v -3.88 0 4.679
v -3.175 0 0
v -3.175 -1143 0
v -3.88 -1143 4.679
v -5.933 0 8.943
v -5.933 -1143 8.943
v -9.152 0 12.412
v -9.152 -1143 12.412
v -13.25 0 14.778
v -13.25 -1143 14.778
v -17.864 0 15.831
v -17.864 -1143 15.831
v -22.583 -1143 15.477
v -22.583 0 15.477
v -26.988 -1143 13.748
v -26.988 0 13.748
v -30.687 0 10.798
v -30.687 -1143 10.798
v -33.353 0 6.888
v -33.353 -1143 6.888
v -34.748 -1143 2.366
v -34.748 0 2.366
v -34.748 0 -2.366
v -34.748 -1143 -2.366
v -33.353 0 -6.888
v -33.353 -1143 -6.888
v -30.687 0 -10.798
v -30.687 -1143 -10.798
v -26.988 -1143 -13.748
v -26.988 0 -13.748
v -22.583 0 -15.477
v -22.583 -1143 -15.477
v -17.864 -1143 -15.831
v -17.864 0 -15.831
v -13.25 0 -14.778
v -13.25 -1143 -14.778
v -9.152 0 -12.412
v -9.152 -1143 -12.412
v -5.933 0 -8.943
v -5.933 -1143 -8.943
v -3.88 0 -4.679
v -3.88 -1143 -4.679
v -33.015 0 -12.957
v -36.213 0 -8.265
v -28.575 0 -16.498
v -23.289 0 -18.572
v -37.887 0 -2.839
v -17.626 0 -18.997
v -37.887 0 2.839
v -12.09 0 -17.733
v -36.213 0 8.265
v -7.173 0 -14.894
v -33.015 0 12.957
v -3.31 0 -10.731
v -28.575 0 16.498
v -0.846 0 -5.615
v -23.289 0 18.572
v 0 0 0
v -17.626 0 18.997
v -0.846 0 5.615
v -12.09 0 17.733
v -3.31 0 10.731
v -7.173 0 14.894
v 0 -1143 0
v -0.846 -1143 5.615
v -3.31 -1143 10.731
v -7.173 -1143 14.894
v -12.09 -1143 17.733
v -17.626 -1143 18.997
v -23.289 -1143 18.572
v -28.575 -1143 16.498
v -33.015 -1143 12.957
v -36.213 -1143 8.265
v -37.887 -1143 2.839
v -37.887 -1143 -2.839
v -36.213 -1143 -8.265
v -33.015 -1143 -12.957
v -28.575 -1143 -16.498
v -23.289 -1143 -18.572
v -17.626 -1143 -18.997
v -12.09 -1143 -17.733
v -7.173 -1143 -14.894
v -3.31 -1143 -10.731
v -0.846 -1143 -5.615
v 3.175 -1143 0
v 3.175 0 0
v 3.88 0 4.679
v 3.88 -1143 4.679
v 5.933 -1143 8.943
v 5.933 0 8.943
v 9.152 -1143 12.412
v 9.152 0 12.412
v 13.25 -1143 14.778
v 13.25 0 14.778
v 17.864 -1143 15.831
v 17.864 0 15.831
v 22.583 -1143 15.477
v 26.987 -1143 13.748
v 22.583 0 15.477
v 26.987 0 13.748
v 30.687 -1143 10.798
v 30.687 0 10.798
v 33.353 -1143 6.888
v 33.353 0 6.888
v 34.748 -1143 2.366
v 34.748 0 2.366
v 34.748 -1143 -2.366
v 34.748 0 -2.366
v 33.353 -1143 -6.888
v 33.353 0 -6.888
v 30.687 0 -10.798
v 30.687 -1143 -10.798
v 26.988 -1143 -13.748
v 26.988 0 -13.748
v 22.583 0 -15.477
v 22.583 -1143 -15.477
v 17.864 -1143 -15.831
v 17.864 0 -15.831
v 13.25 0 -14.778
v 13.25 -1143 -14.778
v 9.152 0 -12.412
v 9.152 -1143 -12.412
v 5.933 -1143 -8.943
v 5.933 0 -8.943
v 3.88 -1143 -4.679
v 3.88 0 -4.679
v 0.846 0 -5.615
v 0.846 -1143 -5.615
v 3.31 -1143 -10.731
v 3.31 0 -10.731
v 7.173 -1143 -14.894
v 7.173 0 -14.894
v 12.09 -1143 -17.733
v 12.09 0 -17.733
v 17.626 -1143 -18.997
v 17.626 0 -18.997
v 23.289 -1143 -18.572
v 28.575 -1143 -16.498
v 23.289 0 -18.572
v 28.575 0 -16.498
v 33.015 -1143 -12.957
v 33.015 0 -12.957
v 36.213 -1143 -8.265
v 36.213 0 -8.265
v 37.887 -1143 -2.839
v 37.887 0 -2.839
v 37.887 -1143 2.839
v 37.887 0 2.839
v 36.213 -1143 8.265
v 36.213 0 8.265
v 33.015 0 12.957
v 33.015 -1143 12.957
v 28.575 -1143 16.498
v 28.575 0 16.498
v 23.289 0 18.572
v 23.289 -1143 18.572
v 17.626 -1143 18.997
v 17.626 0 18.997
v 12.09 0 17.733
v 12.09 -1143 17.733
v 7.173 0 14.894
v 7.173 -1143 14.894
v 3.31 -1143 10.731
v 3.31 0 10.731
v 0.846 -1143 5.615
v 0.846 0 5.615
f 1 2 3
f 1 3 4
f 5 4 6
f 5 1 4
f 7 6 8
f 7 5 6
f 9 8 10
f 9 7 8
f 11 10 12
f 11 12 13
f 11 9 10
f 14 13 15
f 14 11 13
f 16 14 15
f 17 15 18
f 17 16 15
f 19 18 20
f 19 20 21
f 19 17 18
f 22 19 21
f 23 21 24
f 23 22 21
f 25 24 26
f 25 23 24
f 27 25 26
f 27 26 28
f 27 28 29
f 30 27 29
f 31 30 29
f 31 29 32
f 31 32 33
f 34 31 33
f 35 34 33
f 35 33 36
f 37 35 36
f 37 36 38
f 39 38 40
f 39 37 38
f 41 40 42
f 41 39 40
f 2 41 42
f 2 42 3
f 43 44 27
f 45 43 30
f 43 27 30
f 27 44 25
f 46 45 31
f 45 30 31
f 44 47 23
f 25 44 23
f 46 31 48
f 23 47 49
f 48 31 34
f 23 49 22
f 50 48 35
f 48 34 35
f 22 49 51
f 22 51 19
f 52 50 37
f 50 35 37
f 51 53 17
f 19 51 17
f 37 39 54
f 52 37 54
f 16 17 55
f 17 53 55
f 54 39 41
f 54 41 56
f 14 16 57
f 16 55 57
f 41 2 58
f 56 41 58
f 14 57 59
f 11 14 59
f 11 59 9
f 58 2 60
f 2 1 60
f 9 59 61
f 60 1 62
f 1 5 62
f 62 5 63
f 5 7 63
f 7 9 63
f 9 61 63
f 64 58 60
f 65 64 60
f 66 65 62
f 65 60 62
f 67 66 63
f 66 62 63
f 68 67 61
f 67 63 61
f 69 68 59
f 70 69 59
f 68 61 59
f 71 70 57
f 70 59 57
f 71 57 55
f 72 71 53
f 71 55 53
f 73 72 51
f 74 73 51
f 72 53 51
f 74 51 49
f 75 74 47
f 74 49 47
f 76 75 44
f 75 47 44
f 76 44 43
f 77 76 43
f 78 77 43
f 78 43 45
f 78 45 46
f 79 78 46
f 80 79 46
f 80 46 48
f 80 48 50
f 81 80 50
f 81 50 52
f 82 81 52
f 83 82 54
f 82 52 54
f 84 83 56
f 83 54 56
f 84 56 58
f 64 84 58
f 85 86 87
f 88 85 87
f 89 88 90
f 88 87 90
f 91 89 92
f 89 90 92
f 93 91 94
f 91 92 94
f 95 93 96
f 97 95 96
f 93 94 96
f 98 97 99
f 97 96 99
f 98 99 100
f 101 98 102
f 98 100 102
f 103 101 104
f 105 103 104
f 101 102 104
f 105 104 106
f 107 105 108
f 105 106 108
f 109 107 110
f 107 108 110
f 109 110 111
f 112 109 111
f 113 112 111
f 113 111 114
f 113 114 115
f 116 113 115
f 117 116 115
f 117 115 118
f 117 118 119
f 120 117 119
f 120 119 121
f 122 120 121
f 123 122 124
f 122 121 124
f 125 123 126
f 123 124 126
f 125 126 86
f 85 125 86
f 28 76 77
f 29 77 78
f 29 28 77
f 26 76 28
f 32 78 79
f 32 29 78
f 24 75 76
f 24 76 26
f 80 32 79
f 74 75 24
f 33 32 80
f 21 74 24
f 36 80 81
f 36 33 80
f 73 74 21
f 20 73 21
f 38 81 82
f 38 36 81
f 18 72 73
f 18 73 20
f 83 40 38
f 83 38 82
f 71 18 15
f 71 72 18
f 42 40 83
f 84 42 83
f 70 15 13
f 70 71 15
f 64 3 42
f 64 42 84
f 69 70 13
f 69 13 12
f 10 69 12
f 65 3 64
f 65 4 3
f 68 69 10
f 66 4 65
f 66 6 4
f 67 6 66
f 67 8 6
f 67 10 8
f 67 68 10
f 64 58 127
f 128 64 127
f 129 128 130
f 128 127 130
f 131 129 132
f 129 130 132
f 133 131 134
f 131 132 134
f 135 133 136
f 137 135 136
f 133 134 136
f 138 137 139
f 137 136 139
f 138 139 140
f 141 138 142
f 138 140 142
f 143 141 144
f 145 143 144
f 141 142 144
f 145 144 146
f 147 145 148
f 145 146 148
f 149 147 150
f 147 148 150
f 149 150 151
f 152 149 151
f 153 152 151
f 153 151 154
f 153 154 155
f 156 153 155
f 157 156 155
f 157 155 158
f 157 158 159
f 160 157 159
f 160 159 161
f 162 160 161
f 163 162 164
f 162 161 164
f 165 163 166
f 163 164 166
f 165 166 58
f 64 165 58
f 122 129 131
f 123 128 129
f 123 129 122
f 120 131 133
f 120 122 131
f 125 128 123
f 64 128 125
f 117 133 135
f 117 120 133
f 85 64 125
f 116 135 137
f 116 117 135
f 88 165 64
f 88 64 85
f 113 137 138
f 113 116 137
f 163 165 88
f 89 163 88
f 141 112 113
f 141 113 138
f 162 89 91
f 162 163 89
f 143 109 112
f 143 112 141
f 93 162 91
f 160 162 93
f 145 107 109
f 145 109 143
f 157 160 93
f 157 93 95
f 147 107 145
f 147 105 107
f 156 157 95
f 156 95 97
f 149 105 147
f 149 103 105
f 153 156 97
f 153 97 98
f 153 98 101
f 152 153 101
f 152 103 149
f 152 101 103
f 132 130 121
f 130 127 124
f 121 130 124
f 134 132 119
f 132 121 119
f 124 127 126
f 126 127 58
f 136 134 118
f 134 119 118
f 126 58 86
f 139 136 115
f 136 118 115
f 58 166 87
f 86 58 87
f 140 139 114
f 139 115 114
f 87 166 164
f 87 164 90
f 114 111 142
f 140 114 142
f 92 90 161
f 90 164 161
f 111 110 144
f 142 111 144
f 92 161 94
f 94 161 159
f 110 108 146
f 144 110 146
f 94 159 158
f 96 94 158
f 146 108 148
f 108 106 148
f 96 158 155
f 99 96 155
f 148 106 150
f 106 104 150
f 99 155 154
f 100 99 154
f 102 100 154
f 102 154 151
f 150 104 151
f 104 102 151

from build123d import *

# Parameters (mm, degrees)
F0_R     = 19.05
F0_R_2   = 15.875
F1_DEPTH = 1143


with BuildPart() as f1:
    # F0 (on Front) → F1 (new body)
    with BuildSketch(Plane.XZ):
        with BuildLine():
            ThreePointArc((34.925, 0), (19.05, 15.875), (3.175, 0))
            ThreePointArc((3.175, 0), (19.05, -15.875), (34.925, 0))
        make_face()
        with BuildLine():
            ThreePointArc((38.1, 0), (19.05, 19.05), (0, 0))
            ThreePointArc((0, 0), (19.05, -19.05), (38.1, 0))
        make_face()
        with BuildLine():
            ThreePointArc((34.925, 0), (19.05, -15.875), (3.175, 0))
            ThreePointArc((3.175, 0), (19.05, 15.875), (34.925, 0))
        make_face(mode=Mode.SUBTRACT)
        with Locations((-19.05, 0)):
            Circle(F0_R)
        with Locations((-19.05, 0)):
            Circle(F0_R_2, mode=Mode.SUBTRACT)
    extrude(amount=F1_DEPTH)


solid = f1.part
